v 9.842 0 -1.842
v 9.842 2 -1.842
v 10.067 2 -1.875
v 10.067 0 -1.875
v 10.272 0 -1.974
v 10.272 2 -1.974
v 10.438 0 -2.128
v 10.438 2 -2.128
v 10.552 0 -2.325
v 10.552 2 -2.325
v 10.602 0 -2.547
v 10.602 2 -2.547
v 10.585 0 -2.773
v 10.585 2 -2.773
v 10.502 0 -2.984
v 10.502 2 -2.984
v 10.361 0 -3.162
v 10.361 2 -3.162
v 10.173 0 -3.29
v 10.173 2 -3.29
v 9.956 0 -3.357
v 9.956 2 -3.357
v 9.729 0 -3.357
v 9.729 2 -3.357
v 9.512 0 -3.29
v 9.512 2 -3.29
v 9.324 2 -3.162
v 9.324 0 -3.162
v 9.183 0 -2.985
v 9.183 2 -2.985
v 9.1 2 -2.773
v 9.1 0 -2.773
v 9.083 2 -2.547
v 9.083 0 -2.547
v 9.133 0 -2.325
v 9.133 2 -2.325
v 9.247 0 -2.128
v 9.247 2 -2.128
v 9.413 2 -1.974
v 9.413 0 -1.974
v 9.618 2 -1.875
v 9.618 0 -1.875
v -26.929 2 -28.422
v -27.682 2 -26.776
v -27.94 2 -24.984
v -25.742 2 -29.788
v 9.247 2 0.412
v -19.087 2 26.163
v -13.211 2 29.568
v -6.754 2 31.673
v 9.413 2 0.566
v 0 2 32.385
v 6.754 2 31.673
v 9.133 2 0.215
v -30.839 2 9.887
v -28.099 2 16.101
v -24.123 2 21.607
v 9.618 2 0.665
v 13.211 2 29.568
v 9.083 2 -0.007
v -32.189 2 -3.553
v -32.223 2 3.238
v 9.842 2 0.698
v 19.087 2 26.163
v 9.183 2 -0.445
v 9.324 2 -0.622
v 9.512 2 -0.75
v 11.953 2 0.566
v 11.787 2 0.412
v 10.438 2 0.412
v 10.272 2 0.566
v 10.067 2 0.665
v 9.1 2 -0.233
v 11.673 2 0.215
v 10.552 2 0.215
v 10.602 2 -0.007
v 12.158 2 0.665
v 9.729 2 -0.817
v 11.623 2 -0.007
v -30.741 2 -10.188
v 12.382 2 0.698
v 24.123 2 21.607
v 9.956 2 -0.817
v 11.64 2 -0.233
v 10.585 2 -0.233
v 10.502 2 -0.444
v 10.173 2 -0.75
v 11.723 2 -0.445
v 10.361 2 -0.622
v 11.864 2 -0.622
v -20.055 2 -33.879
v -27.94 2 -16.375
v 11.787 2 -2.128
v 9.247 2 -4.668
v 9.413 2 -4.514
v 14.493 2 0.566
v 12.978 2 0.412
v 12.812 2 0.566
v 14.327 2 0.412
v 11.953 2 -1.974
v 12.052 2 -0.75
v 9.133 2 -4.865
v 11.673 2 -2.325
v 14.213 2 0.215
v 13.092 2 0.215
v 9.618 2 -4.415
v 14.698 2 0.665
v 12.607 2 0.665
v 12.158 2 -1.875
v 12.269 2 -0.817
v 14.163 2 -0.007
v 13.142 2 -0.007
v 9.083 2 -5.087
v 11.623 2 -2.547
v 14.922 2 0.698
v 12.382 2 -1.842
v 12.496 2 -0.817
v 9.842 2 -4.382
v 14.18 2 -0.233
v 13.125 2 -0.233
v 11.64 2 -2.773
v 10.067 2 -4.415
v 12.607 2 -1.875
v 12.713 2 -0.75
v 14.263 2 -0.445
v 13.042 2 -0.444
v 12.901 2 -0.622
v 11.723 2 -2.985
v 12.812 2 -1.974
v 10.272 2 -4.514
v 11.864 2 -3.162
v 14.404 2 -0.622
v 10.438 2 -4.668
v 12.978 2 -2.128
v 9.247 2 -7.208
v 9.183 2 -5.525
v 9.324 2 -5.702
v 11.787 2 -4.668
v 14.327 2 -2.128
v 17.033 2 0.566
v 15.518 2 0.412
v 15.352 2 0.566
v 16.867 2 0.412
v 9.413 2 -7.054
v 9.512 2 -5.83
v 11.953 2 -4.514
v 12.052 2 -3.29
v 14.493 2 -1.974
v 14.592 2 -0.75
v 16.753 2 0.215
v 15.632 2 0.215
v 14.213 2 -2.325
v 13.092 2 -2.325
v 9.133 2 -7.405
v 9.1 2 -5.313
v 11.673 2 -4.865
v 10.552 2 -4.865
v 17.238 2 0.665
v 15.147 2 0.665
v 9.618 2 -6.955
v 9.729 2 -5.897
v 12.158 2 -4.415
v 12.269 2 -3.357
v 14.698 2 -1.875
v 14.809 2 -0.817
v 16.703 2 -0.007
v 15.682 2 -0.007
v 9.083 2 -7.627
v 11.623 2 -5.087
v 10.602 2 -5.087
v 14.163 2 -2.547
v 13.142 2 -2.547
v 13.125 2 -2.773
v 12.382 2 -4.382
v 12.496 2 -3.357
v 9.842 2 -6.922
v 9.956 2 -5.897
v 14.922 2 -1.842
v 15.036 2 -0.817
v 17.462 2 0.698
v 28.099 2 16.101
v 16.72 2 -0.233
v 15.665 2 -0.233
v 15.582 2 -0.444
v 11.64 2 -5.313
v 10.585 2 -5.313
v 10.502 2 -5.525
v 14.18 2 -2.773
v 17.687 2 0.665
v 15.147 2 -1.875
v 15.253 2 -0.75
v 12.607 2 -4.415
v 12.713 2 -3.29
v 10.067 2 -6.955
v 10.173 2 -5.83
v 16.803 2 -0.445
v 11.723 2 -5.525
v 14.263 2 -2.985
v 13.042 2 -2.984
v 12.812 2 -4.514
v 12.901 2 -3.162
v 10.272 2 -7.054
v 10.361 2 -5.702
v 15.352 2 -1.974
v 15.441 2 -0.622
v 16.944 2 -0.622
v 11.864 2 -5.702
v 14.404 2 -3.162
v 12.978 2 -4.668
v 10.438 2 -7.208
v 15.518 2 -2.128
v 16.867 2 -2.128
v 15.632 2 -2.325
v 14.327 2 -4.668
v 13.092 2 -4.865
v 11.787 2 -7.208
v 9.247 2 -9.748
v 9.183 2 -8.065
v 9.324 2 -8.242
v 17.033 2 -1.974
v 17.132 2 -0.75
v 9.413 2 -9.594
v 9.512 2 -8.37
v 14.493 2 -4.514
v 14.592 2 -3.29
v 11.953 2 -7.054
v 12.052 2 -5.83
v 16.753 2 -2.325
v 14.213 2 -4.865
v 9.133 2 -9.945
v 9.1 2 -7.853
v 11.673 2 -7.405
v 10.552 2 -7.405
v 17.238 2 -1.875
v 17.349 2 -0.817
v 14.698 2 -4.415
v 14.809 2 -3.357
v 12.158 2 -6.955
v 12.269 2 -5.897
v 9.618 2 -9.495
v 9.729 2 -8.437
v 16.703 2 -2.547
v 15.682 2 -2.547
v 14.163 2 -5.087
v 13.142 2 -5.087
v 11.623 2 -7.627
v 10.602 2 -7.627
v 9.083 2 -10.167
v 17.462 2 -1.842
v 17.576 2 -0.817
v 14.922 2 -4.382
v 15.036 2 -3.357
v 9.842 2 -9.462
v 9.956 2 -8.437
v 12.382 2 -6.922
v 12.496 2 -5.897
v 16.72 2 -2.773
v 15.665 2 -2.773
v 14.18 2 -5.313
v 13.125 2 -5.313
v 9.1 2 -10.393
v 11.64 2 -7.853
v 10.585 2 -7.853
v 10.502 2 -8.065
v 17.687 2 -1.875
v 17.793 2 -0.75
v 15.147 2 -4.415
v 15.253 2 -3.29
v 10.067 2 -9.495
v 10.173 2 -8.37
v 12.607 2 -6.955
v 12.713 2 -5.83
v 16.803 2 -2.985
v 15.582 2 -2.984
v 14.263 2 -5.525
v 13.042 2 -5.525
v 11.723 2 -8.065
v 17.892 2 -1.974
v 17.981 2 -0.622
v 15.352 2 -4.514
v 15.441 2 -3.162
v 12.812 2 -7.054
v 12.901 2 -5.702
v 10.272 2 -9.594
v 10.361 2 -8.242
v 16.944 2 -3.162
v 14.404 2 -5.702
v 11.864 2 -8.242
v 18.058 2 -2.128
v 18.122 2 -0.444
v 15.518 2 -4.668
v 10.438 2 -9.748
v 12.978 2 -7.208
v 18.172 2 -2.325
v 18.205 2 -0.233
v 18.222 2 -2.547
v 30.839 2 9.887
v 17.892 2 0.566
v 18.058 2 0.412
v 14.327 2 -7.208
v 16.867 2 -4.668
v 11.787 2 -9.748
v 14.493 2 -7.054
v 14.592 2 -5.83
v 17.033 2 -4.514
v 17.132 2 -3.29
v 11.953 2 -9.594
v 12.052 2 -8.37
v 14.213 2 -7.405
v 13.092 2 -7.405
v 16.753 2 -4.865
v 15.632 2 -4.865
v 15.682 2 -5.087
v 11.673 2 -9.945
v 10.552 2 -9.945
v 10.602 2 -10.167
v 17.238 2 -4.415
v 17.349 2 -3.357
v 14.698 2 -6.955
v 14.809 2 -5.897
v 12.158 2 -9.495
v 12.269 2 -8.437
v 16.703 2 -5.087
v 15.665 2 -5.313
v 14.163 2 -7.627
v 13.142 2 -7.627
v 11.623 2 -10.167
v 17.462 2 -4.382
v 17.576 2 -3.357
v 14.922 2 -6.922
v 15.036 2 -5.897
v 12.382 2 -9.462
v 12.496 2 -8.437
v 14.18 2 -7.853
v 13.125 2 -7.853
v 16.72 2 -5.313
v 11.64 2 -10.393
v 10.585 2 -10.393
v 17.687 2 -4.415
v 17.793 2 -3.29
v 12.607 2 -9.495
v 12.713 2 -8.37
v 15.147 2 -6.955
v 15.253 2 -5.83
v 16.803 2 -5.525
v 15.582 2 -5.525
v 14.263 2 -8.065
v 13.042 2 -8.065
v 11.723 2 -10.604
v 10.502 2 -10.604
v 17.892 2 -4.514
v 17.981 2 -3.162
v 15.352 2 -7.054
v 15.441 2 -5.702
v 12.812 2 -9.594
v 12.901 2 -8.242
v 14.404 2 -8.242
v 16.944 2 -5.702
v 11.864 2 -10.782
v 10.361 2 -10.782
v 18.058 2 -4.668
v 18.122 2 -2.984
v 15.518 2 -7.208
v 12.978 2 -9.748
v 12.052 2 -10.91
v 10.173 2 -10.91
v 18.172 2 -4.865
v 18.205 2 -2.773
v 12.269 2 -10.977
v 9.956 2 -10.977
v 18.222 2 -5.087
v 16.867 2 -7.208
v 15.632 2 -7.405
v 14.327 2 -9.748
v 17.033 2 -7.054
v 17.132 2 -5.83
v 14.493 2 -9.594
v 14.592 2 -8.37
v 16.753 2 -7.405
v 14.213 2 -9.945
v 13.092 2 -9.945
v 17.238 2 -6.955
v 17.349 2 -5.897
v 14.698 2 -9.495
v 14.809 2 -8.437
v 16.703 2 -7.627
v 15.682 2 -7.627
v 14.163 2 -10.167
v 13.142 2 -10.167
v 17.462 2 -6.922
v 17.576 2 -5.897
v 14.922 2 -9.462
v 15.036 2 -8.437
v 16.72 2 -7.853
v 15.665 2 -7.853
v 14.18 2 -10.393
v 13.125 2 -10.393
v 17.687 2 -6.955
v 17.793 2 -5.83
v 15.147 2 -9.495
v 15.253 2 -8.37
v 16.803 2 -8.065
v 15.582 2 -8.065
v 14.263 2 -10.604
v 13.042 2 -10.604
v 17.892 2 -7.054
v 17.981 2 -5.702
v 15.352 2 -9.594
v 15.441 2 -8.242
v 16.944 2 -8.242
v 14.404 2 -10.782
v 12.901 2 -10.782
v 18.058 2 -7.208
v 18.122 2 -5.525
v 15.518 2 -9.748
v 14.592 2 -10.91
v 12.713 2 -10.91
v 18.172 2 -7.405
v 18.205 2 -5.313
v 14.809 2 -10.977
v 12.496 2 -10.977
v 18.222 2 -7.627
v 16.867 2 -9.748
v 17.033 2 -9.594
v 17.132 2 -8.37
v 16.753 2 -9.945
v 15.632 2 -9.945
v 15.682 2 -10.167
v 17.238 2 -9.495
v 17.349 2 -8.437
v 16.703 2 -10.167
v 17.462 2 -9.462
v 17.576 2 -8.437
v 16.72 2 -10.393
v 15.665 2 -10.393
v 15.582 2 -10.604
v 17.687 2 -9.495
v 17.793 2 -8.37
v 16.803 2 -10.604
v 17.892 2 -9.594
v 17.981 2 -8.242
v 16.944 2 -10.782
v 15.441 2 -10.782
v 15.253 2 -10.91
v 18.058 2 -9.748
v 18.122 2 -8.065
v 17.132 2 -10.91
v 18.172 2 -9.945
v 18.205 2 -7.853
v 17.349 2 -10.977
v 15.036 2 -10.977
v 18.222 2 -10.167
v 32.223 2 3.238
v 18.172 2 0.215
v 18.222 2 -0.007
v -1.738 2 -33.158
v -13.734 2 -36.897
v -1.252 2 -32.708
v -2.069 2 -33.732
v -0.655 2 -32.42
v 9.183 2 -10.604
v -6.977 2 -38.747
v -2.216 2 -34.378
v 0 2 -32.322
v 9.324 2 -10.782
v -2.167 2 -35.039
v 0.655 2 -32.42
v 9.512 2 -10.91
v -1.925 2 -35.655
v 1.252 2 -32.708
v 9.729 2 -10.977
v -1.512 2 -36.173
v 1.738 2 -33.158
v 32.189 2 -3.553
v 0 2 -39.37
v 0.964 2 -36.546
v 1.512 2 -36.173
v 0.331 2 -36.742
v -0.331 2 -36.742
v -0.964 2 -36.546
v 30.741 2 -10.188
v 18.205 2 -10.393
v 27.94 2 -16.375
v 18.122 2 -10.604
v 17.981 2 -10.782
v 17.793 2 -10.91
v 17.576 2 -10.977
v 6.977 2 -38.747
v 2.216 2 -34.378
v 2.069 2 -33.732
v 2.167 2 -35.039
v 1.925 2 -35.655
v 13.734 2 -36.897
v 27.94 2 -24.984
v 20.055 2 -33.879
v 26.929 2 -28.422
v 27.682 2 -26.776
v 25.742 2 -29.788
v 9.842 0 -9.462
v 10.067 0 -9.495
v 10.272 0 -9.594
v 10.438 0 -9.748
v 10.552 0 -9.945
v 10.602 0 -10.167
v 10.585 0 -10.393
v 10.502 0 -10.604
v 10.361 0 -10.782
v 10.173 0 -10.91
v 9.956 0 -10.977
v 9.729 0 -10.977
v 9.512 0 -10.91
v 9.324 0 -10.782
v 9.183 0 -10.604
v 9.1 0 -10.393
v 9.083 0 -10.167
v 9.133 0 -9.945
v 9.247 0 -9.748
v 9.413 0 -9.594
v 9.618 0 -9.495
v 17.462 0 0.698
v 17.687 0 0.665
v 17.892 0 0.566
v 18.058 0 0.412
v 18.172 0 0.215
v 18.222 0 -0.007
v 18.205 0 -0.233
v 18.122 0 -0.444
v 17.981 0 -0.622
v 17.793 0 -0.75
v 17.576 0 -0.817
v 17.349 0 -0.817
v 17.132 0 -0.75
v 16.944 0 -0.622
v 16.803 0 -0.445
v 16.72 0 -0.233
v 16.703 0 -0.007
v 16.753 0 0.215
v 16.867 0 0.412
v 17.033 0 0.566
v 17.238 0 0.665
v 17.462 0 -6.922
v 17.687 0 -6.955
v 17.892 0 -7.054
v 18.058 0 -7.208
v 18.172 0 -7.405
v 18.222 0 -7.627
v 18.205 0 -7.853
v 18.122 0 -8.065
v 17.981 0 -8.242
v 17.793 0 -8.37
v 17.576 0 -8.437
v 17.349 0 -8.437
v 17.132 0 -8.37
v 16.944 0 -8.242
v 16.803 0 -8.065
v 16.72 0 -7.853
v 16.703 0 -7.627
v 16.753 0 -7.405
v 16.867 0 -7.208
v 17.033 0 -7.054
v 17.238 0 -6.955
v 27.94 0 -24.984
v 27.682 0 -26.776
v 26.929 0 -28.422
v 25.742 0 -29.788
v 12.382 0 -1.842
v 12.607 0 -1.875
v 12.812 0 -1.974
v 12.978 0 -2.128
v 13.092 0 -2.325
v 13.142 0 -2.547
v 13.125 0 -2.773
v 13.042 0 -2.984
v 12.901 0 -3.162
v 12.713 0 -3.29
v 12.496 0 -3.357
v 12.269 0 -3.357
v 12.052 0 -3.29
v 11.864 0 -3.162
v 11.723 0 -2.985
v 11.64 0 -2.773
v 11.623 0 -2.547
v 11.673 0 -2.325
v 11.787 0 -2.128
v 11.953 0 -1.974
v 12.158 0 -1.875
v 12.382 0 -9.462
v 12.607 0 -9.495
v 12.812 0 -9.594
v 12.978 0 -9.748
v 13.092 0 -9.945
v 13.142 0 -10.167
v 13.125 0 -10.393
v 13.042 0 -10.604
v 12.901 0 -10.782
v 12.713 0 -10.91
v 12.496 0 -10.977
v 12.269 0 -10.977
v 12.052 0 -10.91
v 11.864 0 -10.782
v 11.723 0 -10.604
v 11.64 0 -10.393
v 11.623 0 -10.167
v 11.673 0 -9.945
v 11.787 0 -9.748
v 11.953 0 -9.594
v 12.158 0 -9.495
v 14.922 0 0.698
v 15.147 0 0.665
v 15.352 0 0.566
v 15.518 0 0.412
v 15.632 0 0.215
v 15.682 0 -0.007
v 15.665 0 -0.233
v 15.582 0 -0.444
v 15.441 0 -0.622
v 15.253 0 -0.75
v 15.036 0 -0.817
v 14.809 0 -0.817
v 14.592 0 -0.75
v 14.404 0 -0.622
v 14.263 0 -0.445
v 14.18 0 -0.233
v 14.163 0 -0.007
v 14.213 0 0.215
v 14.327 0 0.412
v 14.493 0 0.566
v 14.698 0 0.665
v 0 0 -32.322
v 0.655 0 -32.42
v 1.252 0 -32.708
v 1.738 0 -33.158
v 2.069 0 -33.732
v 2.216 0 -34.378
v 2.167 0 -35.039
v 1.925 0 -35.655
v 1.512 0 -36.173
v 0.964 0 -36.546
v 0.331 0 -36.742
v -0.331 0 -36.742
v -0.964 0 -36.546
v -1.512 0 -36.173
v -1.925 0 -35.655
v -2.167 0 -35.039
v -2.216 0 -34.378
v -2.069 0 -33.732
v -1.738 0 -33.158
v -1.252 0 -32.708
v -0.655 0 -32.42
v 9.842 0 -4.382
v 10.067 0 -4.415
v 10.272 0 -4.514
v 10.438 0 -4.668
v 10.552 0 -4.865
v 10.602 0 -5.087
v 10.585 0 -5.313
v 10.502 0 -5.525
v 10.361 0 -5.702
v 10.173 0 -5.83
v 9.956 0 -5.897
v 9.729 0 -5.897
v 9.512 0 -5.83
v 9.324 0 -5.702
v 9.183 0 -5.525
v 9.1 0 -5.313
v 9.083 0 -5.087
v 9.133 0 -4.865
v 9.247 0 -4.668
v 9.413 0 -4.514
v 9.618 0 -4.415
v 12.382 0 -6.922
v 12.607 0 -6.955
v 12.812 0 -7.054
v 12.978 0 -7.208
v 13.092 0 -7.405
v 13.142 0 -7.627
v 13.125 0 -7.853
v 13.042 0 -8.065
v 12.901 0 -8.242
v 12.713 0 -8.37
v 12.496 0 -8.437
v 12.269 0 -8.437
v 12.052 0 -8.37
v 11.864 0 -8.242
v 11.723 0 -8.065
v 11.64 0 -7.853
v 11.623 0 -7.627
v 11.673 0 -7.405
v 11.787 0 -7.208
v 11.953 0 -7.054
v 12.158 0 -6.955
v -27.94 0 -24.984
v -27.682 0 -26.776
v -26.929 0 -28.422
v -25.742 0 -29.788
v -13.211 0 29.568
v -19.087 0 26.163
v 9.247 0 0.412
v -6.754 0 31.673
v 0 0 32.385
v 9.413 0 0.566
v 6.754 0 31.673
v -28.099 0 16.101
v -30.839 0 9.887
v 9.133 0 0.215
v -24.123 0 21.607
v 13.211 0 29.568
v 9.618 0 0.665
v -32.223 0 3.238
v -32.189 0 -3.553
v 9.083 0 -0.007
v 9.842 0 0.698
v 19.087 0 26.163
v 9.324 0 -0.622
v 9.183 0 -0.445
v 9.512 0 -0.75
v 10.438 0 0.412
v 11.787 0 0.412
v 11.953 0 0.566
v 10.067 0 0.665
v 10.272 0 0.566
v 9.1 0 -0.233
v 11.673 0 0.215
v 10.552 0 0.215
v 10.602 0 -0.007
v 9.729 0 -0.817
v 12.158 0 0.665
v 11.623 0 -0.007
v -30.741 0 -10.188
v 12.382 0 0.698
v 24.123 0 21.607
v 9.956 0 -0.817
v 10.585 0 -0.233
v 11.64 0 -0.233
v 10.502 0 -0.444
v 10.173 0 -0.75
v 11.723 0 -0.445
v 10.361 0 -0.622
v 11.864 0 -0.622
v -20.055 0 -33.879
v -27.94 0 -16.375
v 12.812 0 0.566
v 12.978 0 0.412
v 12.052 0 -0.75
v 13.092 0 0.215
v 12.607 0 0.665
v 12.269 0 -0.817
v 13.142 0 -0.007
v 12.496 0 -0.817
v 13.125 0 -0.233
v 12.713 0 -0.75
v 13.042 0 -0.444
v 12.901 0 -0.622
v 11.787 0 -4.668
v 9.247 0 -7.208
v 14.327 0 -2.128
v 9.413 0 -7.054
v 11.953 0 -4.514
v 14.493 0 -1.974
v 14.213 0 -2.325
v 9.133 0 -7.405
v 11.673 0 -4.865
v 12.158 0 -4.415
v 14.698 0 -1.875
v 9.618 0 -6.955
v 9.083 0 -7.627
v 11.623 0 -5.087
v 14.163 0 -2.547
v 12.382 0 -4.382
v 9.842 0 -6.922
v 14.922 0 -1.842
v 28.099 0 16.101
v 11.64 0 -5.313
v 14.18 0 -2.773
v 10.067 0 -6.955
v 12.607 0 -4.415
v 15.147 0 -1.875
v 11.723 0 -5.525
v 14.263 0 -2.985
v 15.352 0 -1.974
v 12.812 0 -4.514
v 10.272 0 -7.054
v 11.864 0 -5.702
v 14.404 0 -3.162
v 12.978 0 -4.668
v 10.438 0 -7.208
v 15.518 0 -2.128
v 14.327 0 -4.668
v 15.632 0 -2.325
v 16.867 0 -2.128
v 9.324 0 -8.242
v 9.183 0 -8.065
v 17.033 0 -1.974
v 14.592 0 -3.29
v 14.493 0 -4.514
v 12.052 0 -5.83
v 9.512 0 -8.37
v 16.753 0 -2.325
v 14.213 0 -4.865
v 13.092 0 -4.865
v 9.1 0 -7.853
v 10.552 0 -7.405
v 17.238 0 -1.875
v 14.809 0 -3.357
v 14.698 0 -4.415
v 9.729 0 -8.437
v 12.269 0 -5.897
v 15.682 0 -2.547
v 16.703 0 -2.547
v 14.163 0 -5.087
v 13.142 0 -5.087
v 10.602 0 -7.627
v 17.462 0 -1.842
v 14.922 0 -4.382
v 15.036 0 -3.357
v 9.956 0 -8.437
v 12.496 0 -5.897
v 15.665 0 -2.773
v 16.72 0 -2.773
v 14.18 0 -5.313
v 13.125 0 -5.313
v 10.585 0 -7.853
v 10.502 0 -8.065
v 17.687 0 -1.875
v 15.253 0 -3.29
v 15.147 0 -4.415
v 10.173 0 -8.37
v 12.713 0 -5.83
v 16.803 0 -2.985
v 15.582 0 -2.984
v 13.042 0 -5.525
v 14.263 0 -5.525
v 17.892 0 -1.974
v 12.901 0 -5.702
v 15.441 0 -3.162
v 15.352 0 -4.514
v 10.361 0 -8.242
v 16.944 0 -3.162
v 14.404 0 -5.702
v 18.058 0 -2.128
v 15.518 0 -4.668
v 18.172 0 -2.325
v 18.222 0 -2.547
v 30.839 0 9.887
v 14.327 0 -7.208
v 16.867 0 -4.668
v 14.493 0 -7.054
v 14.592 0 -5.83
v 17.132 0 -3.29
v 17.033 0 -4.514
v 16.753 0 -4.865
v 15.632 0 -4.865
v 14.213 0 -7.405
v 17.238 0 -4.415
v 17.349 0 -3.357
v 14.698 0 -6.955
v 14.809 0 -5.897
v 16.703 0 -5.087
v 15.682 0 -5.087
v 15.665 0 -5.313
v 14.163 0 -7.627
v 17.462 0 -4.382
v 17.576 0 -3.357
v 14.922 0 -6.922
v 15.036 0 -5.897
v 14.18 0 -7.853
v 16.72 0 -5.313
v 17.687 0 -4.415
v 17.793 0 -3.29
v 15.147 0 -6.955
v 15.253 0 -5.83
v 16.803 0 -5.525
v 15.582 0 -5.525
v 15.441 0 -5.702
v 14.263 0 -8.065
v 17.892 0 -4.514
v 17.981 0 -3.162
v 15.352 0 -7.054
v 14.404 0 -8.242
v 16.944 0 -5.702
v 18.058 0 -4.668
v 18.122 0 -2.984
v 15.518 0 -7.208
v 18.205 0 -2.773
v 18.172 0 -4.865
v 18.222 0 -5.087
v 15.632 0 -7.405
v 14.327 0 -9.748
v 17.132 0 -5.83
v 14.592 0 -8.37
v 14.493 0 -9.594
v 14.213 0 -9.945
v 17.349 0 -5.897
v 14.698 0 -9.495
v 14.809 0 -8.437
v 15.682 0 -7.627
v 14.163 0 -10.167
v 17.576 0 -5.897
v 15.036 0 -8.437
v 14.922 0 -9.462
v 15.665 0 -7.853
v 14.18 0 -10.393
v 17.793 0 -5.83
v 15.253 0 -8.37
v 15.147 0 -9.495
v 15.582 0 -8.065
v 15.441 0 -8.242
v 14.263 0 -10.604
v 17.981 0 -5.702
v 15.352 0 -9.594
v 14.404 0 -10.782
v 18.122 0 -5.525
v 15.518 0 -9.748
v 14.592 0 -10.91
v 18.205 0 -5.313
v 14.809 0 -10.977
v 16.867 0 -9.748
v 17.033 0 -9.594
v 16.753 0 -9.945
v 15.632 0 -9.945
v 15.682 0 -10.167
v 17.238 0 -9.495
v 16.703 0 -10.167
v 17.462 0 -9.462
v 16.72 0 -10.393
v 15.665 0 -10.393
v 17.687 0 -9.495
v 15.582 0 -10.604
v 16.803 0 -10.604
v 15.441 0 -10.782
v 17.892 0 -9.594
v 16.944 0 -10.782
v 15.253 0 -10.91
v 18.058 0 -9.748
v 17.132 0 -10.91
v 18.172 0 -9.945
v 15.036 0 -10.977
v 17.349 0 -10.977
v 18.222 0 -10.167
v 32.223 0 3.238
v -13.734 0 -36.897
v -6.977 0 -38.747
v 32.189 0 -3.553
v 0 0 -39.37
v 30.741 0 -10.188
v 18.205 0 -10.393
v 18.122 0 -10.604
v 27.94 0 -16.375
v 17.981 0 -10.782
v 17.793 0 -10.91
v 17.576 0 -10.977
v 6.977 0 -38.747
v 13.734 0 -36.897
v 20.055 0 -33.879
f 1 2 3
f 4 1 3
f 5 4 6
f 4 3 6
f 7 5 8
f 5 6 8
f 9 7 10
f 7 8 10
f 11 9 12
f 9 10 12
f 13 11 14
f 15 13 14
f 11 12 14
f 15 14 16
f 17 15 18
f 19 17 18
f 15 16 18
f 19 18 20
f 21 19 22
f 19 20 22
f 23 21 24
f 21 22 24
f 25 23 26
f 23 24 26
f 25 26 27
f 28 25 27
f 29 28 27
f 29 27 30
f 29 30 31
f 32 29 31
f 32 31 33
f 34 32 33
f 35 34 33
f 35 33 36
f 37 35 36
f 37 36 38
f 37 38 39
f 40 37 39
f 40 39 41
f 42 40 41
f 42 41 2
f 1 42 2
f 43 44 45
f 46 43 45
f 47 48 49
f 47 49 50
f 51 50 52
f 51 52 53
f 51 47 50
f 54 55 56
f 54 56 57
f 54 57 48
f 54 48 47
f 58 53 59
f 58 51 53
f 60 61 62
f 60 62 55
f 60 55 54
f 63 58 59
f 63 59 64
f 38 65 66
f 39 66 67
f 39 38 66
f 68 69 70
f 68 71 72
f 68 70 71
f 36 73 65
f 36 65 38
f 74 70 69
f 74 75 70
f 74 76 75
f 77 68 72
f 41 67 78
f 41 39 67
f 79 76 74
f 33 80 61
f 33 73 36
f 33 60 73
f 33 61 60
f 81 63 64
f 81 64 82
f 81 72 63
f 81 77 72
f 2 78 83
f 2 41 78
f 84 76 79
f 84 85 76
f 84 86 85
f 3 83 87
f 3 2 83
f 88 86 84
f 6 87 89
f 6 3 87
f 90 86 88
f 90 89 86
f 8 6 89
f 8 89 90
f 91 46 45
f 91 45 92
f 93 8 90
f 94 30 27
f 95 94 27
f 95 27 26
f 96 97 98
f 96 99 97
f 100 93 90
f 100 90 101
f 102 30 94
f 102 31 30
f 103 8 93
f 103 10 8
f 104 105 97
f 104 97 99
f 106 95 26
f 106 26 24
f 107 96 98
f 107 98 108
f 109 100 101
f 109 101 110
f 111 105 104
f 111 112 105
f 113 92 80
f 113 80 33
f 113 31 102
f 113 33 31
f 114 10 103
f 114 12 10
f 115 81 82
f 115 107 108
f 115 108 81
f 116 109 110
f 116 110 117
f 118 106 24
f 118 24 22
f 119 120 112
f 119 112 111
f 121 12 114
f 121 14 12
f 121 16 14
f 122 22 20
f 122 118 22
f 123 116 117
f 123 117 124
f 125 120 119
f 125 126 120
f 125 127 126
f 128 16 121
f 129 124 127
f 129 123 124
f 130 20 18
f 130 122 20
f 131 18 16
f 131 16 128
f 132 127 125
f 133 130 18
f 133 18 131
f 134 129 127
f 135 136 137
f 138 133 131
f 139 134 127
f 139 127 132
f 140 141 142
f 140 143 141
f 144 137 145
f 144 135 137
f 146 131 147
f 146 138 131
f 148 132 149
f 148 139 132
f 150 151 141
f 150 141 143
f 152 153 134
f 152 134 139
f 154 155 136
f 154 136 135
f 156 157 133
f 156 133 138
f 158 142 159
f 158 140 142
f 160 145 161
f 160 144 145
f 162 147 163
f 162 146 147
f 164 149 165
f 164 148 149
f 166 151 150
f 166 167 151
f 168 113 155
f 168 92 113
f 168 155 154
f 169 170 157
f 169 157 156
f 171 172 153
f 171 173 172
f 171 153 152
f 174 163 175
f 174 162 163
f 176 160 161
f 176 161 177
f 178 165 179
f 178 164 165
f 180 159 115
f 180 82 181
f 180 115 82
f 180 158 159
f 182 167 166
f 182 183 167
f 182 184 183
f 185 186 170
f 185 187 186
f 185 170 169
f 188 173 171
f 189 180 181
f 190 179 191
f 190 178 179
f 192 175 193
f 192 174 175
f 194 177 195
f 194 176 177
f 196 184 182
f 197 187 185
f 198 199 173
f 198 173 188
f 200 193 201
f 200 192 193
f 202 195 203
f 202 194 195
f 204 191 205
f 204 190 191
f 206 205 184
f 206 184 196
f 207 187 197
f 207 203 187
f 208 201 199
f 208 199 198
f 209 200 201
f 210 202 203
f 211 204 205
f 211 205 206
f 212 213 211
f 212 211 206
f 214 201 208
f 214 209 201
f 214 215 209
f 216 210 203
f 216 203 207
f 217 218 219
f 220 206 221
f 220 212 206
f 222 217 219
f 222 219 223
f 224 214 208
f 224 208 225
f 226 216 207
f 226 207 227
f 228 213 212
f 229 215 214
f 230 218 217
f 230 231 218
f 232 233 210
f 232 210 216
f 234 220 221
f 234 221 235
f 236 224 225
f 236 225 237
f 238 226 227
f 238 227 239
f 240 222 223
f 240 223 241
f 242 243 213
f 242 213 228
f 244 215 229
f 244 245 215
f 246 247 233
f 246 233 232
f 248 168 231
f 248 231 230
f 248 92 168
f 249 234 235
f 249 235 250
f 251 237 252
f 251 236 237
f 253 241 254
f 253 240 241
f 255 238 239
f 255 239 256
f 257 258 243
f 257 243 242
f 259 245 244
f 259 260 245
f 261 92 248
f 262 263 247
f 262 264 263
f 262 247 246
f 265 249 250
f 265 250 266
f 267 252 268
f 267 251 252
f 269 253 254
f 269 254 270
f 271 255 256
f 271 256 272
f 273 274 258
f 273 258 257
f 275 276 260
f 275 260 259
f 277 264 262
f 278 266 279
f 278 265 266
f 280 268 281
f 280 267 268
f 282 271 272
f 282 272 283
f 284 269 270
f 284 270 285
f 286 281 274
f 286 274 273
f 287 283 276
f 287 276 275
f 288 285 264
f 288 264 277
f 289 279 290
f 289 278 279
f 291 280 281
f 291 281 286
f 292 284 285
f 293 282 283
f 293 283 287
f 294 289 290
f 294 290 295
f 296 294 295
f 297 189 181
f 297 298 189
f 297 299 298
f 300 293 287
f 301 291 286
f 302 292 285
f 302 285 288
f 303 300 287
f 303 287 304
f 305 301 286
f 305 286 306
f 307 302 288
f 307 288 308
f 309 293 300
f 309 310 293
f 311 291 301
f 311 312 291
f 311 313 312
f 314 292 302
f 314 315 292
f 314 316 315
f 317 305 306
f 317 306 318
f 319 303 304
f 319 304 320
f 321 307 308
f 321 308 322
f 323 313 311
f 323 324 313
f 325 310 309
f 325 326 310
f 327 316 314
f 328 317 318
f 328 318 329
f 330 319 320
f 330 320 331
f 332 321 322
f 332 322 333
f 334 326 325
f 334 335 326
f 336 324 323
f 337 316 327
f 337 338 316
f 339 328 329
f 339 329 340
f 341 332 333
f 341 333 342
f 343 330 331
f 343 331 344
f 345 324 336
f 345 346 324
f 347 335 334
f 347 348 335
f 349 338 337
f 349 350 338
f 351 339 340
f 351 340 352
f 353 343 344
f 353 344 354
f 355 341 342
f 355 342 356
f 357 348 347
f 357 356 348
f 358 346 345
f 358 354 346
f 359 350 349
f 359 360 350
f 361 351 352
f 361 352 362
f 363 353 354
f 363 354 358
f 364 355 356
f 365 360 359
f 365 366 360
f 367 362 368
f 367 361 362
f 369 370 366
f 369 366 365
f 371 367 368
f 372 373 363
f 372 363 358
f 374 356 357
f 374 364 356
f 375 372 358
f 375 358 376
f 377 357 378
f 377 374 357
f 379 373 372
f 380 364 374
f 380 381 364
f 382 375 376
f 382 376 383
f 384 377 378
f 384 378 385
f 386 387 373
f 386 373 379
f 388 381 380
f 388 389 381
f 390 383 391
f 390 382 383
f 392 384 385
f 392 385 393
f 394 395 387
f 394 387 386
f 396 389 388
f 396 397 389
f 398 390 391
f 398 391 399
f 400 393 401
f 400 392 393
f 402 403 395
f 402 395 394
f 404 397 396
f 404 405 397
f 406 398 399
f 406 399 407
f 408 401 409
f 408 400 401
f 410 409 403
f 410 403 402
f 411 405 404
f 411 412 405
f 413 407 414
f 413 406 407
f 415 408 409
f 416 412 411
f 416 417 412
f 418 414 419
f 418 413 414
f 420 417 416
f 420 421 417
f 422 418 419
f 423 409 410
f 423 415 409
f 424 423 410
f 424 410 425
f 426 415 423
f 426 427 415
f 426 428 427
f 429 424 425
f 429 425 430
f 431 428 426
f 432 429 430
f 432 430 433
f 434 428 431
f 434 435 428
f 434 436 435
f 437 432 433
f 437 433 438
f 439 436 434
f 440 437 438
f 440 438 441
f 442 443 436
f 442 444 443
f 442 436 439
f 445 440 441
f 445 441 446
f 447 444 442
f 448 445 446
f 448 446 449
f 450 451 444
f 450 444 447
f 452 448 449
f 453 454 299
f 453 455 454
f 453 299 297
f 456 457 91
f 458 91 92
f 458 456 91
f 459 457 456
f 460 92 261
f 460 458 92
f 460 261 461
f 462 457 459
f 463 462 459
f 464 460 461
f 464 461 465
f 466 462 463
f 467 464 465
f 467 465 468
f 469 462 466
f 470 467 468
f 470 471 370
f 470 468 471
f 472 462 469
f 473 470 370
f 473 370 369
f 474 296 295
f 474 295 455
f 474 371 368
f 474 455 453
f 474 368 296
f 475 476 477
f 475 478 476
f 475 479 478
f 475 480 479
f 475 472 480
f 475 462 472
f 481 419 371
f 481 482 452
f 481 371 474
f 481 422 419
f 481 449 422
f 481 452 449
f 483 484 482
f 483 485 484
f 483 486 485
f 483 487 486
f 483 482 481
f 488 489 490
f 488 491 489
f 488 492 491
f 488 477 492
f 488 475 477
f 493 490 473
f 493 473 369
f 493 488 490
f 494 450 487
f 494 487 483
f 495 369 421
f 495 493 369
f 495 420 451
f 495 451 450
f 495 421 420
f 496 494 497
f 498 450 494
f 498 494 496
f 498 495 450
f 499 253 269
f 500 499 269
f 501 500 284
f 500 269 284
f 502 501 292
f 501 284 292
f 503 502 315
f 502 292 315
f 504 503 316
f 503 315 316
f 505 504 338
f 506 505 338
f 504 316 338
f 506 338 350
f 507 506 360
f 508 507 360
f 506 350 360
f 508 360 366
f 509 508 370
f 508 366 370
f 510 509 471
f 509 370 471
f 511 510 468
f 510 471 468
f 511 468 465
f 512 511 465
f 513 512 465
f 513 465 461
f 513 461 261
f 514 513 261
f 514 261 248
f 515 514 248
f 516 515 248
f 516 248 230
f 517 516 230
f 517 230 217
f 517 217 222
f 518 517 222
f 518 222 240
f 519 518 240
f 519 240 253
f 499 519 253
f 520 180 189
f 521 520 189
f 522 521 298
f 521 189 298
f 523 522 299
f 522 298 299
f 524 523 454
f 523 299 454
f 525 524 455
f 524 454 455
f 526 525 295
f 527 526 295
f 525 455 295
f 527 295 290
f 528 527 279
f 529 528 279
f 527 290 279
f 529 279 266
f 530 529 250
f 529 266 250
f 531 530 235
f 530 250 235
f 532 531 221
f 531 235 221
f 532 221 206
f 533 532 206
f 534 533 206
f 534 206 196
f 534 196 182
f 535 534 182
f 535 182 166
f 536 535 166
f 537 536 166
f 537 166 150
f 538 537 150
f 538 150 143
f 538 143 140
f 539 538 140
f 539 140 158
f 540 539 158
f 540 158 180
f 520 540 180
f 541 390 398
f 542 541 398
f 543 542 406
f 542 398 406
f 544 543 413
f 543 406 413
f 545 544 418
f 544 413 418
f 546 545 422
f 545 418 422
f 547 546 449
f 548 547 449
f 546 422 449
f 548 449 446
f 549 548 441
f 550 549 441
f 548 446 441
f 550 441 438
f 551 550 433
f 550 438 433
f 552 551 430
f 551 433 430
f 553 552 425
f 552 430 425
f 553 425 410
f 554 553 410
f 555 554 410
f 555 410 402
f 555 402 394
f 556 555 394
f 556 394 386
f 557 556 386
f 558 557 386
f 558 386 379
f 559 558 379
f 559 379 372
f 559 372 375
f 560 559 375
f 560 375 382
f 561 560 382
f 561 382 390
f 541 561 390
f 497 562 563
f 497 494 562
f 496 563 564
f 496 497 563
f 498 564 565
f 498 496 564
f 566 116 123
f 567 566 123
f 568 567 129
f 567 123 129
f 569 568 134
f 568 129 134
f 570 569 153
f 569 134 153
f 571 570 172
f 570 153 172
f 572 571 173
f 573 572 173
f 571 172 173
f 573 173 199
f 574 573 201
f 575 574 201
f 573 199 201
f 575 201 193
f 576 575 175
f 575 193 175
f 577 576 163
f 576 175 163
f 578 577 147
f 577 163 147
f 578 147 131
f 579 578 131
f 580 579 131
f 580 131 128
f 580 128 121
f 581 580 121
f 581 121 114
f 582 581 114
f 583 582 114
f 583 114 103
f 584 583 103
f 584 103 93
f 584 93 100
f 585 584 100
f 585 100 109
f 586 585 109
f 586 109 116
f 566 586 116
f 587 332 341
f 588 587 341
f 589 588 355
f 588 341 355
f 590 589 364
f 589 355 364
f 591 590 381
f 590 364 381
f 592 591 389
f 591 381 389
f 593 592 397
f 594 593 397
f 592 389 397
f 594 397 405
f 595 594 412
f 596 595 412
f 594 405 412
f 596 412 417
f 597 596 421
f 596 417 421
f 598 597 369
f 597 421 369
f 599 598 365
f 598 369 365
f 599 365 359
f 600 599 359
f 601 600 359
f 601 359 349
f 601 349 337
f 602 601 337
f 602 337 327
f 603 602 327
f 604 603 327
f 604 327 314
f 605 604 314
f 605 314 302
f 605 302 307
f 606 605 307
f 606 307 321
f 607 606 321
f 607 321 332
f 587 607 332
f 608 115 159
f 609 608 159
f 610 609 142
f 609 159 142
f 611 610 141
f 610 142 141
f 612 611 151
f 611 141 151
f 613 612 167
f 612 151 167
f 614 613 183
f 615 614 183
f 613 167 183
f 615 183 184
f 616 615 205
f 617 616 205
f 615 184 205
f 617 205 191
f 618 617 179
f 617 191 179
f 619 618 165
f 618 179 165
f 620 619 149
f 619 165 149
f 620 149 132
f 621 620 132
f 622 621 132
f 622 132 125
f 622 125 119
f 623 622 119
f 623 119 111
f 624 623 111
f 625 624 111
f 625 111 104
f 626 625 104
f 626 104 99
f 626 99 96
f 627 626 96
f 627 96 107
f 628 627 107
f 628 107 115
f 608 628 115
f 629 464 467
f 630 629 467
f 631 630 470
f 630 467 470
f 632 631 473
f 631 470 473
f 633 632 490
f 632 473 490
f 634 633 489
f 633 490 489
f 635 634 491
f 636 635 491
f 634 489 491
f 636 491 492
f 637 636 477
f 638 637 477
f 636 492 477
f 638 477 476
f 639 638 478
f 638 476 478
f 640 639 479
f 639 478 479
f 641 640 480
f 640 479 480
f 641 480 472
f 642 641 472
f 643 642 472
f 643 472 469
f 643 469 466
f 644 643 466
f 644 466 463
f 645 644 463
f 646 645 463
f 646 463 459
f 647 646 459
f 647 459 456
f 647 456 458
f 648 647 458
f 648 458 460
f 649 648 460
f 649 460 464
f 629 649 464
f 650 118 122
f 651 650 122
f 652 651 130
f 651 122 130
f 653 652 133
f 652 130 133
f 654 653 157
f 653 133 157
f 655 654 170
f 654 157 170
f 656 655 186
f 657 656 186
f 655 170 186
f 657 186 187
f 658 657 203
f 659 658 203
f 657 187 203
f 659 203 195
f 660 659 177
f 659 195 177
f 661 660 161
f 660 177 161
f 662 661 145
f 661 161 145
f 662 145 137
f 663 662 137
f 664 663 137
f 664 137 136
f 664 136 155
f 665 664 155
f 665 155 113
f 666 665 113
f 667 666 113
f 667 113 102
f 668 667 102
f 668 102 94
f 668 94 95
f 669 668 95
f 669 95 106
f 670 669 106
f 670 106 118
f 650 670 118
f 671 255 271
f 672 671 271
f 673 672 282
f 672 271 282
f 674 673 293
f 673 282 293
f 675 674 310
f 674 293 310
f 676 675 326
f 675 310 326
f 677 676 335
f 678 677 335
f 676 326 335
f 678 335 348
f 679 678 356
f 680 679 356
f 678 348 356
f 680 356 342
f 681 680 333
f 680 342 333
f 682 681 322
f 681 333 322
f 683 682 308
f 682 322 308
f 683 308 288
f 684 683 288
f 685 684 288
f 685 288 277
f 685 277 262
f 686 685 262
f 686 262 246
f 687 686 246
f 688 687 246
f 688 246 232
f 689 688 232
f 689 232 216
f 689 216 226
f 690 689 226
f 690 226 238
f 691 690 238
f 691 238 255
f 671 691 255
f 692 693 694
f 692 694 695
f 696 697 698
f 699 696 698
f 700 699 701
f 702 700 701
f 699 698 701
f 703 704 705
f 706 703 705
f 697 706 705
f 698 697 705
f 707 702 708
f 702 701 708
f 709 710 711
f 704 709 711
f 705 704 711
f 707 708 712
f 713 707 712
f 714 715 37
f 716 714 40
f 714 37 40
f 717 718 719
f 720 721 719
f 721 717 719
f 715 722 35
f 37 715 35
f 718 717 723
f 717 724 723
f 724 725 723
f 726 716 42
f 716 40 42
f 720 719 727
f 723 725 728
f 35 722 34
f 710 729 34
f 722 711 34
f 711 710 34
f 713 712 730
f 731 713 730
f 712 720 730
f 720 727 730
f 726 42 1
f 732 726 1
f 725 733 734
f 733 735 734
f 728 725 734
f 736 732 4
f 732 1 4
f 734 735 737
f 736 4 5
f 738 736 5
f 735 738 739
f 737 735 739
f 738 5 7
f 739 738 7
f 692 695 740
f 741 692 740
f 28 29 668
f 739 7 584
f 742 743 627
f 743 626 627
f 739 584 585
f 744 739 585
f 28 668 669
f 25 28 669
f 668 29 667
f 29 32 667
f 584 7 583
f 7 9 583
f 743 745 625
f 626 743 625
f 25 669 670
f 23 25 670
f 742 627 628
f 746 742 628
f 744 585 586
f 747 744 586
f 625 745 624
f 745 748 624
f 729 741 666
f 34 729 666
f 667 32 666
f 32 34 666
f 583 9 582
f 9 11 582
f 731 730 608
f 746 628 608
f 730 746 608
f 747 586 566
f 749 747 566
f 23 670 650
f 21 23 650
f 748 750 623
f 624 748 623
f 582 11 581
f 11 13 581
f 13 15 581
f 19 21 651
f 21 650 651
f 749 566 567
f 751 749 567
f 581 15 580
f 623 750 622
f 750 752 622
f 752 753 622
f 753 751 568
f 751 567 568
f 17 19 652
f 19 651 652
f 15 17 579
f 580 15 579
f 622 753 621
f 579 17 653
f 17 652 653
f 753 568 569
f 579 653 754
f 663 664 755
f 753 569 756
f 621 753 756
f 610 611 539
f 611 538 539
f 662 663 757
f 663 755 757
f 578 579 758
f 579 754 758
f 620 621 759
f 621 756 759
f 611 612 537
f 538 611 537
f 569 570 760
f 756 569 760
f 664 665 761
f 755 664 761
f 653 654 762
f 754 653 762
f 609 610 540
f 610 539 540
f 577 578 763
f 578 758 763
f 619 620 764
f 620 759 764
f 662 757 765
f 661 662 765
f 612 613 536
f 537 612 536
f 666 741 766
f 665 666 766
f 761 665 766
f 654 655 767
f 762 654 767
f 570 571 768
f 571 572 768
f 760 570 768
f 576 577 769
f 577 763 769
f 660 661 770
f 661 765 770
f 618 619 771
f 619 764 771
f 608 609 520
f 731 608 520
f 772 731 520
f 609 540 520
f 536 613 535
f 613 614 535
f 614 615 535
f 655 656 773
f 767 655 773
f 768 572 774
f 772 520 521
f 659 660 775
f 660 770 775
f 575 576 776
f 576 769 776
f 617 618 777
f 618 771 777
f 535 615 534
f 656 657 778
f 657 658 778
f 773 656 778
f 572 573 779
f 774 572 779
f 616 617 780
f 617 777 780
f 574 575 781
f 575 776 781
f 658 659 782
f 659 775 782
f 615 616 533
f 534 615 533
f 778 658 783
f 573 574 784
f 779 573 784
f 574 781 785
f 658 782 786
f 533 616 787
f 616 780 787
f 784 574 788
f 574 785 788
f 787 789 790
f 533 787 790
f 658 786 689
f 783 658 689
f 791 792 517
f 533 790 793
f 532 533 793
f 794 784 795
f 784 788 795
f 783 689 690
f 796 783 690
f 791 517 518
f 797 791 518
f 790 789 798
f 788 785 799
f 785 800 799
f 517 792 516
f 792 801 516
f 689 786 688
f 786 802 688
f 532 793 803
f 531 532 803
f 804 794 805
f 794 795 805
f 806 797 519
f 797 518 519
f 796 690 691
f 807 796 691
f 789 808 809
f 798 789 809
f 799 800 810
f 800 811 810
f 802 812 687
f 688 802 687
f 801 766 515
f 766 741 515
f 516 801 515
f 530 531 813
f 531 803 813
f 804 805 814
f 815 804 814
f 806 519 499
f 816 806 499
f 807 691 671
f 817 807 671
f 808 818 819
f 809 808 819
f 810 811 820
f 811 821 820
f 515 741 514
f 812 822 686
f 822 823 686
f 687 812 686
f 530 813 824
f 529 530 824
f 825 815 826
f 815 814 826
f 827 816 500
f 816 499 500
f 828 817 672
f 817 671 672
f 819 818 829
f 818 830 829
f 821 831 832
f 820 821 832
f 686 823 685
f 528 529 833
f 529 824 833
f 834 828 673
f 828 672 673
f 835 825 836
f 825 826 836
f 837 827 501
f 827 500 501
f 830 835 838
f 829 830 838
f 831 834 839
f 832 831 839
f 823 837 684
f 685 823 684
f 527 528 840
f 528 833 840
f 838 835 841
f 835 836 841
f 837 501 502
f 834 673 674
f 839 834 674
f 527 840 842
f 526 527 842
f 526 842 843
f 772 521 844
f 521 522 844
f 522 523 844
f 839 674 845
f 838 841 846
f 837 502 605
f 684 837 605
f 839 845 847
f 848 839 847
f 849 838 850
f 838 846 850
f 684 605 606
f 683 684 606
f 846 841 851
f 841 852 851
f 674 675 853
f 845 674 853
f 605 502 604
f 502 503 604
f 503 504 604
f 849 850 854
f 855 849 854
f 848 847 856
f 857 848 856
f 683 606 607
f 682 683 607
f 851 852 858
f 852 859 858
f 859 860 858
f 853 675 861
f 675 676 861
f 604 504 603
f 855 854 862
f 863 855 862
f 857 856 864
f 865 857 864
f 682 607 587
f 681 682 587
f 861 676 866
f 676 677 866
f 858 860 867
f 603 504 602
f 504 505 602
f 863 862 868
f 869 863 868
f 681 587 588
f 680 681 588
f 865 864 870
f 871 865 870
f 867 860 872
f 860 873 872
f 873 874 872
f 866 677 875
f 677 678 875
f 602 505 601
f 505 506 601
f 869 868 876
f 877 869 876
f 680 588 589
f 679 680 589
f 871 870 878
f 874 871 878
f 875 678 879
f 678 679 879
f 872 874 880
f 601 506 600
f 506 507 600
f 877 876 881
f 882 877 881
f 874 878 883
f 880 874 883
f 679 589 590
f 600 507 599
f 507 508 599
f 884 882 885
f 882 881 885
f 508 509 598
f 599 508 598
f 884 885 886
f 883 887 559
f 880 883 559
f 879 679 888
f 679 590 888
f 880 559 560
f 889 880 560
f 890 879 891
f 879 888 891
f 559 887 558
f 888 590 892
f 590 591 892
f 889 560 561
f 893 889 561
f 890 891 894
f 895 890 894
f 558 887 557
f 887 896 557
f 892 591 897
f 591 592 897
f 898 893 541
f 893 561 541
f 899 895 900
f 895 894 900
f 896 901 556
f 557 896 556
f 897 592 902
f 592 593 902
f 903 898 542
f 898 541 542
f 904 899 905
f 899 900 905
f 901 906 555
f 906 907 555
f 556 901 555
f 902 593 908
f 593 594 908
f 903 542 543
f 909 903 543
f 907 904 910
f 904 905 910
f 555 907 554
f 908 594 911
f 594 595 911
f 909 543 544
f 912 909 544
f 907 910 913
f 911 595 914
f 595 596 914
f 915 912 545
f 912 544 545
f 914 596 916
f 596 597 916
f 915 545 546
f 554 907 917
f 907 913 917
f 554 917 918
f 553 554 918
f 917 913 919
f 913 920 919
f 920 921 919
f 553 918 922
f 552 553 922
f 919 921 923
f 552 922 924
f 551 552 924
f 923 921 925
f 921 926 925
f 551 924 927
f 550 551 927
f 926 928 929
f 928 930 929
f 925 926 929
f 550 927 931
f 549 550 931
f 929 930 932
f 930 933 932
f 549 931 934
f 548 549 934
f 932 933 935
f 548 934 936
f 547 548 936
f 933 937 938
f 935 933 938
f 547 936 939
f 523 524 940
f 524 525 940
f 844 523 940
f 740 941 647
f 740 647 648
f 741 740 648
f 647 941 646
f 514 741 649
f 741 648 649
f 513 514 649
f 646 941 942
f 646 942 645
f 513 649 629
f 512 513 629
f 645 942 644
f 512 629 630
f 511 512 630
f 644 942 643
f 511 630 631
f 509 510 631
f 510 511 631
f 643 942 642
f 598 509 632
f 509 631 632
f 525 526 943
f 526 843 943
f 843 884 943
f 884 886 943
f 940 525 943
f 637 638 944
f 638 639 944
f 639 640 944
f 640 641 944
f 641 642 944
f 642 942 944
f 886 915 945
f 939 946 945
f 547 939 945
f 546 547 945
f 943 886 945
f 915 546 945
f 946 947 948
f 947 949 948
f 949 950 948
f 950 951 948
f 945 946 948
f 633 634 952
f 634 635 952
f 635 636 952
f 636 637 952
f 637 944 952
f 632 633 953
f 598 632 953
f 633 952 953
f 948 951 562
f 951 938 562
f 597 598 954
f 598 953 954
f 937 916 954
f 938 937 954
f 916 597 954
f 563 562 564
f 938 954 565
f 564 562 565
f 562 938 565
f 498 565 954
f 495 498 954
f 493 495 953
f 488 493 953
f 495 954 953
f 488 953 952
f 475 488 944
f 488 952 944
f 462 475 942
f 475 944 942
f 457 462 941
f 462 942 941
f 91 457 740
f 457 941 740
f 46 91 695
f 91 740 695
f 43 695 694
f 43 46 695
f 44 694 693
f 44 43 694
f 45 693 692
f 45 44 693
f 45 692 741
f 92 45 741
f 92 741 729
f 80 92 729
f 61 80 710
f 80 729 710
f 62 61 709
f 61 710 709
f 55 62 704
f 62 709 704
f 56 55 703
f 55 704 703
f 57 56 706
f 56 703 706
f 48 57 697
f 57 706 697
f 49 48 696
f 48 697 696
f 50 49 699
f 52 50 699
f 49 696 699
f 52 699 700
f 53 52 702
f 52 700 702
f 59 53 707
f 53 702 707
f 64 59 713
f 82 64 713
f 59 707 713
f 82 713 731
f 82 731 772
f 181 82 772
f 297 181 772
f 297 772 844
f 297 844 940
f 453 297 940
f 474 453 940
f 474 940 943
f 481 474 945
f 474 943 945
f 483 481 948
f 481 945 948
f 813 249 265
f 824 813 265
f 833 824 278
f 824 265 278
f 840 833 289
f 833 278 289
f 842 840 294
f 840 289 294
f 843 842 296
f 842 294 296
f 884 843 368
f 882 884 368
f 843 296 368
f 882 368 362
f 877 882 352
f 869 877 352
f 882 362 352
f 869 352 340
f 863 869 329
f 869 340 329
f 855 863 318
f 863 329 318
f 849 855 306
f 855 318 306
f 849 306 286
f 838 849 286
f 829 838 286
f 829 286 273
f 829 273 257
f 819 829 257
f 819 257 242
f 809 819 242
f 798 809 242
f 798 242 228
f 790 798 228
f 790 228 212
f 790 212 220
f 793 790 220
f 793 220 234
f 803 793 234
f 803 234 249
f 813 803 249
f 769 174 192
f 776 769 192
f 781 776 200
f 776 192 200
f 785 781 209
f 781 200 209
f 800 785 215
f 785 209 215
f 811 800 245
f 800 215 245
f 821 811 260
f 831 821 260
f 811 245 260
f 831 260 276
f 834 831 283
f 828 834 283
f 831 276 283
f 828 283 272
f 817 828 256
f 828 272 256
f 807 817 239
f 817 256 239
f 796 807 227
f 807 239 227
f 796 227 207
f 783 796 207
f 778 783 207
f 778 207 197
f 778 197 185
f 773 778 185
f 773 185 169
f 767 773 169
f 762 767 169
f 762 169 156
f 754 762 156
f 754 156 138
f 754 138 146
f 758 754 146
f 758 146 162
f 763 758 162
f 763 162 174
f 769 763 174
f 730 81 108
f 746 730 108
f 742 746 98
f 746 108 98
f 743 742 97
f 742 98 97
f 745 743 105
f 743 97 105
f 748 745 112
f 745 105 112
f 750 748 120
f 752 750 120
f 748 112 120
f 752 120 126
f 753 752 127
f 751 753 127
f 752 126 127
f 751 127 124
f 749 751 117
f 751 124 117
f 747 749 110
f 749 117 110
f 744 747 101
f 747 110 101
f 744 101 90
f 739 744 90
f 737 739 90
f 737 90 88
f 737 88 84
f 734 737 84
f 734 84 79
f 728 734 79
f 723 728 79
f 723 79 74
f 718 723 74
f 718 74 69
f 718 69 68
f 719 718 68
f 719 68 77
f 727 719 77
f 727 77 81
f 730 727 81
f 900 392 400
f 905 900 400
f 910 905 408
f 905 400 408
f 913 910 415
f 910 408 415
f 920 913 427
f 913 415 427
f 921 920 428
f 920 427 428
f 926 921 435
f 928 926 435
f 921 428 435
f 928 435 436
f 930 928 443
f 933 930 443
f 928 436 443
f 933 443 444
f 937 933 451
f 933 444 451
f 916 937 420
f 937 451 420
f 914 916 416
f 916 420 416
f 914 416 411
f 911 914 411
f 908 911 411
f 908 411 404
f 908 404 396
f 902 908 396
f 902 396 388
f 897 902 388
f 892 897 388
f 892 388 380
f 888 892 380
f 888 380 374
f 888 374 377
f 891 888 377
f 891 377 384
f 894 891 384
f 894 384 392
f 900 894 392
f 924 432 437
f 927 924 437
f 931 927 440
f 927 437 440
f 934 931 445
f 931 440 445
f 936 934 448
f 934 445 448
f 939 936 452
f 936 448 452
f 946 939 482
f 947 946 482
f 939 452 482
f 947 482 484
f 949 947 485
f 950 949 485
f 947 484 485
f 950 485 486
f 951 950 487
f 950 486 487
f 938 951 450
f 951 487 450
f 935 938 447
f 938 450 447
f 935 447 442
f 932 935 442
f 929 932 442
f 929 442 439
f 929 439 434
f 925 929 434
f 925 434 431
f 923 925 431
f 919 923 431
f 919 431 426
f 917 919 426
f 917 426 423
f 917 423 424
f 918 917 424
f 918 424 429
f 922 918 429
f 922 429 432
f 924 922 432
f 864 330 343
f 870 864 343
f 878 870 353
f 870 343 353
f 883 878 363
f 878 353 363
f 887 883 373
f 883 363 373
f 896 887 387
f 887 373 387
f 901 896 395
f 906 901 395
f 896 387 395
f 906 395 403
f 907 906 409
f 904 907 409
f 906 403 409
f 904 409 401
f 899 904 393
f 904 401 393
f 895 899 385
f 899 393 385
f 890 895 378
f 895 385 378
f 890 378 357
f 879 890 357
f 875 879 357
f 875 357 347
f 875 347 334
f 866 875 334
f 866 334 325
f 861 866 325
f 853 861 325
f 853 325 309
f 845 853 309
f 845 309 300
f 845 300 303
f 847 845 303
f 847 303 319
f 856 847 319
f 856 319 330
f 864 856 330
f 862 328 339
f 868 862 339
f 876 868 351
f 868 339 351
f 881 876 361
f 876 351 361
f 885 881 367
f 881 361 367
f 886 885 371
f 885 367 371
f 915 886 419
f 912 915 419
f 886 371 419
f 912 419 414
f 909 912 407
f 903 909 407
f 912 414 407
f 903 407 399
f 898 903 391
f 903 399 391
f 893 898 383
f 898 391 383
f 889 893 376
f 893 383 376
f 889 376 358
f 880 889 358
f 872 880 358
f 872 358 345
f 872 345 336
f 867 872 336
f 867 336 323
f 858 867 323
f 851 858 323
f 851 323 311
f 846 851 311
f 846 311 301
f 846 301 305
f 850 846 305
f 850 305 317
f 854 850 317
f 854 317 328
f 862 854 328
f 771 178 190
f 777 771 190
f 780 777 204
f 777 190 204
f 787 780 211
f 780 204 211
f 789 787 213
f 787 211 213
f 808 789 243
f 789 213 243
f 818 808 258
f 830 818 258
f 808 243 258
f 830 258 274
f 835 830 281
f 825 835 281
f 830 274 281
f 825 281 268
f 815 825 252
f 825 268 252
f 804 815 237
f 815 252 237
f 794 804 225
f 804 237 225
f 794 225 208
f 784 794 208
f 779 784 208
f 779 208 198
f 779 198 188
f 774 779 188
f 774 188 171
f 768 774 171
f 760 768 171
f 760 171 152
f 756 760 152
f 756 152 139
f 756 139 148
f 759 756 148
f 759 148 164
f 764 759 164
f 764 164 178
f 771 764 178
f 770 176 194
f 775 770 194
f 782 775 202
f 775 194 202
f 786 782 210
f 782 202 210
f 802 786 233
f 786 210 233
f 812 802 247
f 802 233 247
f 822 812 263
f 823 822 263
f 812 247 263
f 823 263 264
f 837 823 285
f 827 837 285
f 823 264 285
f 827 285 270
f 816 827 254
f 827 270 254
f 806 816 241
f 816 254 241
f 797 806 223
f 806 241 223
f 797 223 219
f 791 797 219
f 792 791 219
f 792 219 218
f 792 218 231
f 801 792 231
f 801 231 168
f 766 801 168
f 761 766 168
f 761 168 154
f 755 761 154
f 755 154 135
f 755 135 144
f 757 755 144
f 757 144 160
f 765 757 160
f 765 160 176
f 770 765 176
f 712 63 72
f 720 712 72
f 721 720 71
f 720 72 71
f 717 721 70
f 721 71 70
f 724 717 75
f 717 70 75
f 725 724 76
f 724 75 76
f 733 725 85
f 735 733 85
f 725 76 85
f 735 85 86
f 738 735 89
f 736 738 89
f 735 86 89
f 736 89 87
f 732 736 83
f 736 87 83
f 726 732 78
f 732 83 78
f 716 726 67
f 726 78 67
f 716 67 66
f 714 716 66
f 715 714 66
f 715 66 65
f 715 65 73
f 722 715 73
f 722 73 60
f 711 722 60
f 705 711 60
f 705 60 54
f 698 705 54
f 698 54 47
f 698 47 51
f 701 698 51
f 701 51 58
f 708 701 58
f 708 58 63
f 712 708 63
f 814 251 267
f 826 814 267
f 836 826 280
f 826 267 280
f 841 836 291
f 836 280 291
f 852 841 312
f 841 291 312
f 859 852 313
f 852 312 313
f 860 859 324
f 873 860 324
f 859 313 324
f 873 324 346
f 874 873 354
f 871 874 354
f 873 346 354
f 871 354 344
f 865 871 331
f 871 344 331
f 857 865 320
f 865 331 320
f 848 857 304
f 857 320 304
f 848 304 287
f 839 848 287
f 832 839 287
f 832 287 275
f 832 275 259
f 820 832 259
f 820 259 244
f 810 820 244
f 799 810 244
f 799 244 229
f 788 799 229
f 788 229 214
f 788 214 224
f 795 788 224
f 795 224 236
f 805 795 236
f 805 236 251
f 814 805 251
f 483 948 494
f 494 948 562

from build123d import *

# Parameters (mm, degrees)
SKETCH1_R           = 32.385
BOSS_EXTRUDE1_DEPTH = 2
FILLET1_R           = 6.35
SKETCH2_R           = 2.2225
CUT_EXTRUDE1_DEPTH  = 52.017498224
SKETCH5_R           = 0.762
CUT_EXTRUDE2_DEPTH  = 52.017498224


with BuildPart() as part:
    # Sketch1 → Boss-Extrude1 (new body)
    with BuildSketch(Plane(origin=(0, 0, 0), x_dir=(1, 0, 0), z_dir=(0, 1, 0))):
        Circle(SKETCH1_R)
        with BuildLine():
            Line((-27.94, 27.737218678), (-27.94, 16.375122137))
            ThreePointArc((-27.94, 16.375122137), (0, 32.385), (27.94, 16.375122137))
            Line((27.94, 16.375122137), (27.94, 27.737218678))
            ThreePointArc((27.94, 27.737218678), (0, 39.37), (-27.94, 27.737218678))
        make_face()
    extrude(amount=BOSS_EXTRUDE1_DEPTH)

    # Fillet1
    fillet1_edges = [part.edges().sort_by_distance(p)[0] for p in [
        (-27.94, 1, -27.737218678),
        (27.94, 1, -27.737218678),
    ]]
    fillet(fillet1_edges, radius=FILLET1_R)

    # Sketch2 → Cut-Extrude1 (cut, through all)
    with BuildSketch(Plane(origin=(0, 2, 0), x_dir=(1, 0, 0), z_dir=(0, 1, 0))):
        with Locations(Location((0, 34.544, 0), (0, 0, 270))):
            Circle(SKETCH2_R)
    extrude(amount=-CUT_EXTRUDE1_DEPTH, mode=Mode.SUBTRACT)

    # Sketch5 → Cut-Extrude2 (cut, through all)
    with BuildSketch(Plane(origin=(0, 2, 0), x_dir=(1, 0, 0), z_dir=(0, 1, 0))):
        with Locations(Location((9.8425, 10.2235, 0), (0, 0, 270))):
            Circle(SKETCH5_R)
        with Locations(Location((12.3825, 10.2235, 0), (0, 0, 270))):
            Circle(SKETCH5_R)
        with Locations(Location((14.9225, 10.2235, 0), (0, 0, 270))):
            Circle(SKETCH5_R)
        with Locations(Location((17.4625, 10.2235, 0), (0, 0, 270))):
            Circle(SKETCH5_R)
        with Locations(Location((9.8425, 7.6835, 0), (0, 0, 270))):
            Circle(SKETCH5_R)
        with Locations(Location((12.3825, 7.6835, 0), (0, 0, 270))):
            Circle(SKETCH5_R)
        with Locations(Location((14.9225, 7.6835, 0), (0, 0, 270))):
            Circle(SKETCH5_R)
        with Locations(Location((17.4625, 7.6835, 0), (0, 0, 270))):
            Circle(SKETCH5_R)
        with Locations(Location((9.8425, 5.1435, 0), (0, 0, 270))):
            Circle(SKETCH5_R)
        with Locations(Location((12.3825, 5.1435, 0), (0, 0, 270))):
            Circle(SKETCH5_R)
        with Locations(Location((14.9225, 5.1435, 0), (0, 0, 270))):
            Circle(SKETCH5_R)
        with Locations(Location((17.4625, 5.1435, 0), (0, 0, 270))):
            Circle(SKETCH5_R)
        with Locations(Location((9.8425, 2.6035, 0), (0, 0, 270))):
            Circle(SKETCH5_R)
        with Locations(Location((12.3825, 2.6035, 0), (0, 0, 270))):
            Circle(SKETCH5_R)
        with Locations(Location((14.9225, 2.6035, 0), (0, 0, 270))):
            Circle(SKETCH5_R)
        with Locations(Location((17.4625, 2.6035, 0), (0, 0, 270))):
            Circle(SKETCH5_R)
        with Locations(Location((9.8425, 0.0635, 0), (0, 0, 270))):
            Circle(SKETCH5_R)
        with Locations(Location((12.3825, 0.0635, 0), (0, 0, 270))):
            Circle(SKETCH5_R)
        with Locations(Location((14.9225, 0.0635, 0), (0, 0, 270))):
            Circle(SKETCH5_R)
        with Locations(Location((17.4625, 0.0635, 0), (0, 0, 270))):
            Circle(SKETCH5_R)
    extrude(amount=-CUT_EXTRUDE2_DEPTH, mode=Mode.SUBTRACT)


solid = part.part
